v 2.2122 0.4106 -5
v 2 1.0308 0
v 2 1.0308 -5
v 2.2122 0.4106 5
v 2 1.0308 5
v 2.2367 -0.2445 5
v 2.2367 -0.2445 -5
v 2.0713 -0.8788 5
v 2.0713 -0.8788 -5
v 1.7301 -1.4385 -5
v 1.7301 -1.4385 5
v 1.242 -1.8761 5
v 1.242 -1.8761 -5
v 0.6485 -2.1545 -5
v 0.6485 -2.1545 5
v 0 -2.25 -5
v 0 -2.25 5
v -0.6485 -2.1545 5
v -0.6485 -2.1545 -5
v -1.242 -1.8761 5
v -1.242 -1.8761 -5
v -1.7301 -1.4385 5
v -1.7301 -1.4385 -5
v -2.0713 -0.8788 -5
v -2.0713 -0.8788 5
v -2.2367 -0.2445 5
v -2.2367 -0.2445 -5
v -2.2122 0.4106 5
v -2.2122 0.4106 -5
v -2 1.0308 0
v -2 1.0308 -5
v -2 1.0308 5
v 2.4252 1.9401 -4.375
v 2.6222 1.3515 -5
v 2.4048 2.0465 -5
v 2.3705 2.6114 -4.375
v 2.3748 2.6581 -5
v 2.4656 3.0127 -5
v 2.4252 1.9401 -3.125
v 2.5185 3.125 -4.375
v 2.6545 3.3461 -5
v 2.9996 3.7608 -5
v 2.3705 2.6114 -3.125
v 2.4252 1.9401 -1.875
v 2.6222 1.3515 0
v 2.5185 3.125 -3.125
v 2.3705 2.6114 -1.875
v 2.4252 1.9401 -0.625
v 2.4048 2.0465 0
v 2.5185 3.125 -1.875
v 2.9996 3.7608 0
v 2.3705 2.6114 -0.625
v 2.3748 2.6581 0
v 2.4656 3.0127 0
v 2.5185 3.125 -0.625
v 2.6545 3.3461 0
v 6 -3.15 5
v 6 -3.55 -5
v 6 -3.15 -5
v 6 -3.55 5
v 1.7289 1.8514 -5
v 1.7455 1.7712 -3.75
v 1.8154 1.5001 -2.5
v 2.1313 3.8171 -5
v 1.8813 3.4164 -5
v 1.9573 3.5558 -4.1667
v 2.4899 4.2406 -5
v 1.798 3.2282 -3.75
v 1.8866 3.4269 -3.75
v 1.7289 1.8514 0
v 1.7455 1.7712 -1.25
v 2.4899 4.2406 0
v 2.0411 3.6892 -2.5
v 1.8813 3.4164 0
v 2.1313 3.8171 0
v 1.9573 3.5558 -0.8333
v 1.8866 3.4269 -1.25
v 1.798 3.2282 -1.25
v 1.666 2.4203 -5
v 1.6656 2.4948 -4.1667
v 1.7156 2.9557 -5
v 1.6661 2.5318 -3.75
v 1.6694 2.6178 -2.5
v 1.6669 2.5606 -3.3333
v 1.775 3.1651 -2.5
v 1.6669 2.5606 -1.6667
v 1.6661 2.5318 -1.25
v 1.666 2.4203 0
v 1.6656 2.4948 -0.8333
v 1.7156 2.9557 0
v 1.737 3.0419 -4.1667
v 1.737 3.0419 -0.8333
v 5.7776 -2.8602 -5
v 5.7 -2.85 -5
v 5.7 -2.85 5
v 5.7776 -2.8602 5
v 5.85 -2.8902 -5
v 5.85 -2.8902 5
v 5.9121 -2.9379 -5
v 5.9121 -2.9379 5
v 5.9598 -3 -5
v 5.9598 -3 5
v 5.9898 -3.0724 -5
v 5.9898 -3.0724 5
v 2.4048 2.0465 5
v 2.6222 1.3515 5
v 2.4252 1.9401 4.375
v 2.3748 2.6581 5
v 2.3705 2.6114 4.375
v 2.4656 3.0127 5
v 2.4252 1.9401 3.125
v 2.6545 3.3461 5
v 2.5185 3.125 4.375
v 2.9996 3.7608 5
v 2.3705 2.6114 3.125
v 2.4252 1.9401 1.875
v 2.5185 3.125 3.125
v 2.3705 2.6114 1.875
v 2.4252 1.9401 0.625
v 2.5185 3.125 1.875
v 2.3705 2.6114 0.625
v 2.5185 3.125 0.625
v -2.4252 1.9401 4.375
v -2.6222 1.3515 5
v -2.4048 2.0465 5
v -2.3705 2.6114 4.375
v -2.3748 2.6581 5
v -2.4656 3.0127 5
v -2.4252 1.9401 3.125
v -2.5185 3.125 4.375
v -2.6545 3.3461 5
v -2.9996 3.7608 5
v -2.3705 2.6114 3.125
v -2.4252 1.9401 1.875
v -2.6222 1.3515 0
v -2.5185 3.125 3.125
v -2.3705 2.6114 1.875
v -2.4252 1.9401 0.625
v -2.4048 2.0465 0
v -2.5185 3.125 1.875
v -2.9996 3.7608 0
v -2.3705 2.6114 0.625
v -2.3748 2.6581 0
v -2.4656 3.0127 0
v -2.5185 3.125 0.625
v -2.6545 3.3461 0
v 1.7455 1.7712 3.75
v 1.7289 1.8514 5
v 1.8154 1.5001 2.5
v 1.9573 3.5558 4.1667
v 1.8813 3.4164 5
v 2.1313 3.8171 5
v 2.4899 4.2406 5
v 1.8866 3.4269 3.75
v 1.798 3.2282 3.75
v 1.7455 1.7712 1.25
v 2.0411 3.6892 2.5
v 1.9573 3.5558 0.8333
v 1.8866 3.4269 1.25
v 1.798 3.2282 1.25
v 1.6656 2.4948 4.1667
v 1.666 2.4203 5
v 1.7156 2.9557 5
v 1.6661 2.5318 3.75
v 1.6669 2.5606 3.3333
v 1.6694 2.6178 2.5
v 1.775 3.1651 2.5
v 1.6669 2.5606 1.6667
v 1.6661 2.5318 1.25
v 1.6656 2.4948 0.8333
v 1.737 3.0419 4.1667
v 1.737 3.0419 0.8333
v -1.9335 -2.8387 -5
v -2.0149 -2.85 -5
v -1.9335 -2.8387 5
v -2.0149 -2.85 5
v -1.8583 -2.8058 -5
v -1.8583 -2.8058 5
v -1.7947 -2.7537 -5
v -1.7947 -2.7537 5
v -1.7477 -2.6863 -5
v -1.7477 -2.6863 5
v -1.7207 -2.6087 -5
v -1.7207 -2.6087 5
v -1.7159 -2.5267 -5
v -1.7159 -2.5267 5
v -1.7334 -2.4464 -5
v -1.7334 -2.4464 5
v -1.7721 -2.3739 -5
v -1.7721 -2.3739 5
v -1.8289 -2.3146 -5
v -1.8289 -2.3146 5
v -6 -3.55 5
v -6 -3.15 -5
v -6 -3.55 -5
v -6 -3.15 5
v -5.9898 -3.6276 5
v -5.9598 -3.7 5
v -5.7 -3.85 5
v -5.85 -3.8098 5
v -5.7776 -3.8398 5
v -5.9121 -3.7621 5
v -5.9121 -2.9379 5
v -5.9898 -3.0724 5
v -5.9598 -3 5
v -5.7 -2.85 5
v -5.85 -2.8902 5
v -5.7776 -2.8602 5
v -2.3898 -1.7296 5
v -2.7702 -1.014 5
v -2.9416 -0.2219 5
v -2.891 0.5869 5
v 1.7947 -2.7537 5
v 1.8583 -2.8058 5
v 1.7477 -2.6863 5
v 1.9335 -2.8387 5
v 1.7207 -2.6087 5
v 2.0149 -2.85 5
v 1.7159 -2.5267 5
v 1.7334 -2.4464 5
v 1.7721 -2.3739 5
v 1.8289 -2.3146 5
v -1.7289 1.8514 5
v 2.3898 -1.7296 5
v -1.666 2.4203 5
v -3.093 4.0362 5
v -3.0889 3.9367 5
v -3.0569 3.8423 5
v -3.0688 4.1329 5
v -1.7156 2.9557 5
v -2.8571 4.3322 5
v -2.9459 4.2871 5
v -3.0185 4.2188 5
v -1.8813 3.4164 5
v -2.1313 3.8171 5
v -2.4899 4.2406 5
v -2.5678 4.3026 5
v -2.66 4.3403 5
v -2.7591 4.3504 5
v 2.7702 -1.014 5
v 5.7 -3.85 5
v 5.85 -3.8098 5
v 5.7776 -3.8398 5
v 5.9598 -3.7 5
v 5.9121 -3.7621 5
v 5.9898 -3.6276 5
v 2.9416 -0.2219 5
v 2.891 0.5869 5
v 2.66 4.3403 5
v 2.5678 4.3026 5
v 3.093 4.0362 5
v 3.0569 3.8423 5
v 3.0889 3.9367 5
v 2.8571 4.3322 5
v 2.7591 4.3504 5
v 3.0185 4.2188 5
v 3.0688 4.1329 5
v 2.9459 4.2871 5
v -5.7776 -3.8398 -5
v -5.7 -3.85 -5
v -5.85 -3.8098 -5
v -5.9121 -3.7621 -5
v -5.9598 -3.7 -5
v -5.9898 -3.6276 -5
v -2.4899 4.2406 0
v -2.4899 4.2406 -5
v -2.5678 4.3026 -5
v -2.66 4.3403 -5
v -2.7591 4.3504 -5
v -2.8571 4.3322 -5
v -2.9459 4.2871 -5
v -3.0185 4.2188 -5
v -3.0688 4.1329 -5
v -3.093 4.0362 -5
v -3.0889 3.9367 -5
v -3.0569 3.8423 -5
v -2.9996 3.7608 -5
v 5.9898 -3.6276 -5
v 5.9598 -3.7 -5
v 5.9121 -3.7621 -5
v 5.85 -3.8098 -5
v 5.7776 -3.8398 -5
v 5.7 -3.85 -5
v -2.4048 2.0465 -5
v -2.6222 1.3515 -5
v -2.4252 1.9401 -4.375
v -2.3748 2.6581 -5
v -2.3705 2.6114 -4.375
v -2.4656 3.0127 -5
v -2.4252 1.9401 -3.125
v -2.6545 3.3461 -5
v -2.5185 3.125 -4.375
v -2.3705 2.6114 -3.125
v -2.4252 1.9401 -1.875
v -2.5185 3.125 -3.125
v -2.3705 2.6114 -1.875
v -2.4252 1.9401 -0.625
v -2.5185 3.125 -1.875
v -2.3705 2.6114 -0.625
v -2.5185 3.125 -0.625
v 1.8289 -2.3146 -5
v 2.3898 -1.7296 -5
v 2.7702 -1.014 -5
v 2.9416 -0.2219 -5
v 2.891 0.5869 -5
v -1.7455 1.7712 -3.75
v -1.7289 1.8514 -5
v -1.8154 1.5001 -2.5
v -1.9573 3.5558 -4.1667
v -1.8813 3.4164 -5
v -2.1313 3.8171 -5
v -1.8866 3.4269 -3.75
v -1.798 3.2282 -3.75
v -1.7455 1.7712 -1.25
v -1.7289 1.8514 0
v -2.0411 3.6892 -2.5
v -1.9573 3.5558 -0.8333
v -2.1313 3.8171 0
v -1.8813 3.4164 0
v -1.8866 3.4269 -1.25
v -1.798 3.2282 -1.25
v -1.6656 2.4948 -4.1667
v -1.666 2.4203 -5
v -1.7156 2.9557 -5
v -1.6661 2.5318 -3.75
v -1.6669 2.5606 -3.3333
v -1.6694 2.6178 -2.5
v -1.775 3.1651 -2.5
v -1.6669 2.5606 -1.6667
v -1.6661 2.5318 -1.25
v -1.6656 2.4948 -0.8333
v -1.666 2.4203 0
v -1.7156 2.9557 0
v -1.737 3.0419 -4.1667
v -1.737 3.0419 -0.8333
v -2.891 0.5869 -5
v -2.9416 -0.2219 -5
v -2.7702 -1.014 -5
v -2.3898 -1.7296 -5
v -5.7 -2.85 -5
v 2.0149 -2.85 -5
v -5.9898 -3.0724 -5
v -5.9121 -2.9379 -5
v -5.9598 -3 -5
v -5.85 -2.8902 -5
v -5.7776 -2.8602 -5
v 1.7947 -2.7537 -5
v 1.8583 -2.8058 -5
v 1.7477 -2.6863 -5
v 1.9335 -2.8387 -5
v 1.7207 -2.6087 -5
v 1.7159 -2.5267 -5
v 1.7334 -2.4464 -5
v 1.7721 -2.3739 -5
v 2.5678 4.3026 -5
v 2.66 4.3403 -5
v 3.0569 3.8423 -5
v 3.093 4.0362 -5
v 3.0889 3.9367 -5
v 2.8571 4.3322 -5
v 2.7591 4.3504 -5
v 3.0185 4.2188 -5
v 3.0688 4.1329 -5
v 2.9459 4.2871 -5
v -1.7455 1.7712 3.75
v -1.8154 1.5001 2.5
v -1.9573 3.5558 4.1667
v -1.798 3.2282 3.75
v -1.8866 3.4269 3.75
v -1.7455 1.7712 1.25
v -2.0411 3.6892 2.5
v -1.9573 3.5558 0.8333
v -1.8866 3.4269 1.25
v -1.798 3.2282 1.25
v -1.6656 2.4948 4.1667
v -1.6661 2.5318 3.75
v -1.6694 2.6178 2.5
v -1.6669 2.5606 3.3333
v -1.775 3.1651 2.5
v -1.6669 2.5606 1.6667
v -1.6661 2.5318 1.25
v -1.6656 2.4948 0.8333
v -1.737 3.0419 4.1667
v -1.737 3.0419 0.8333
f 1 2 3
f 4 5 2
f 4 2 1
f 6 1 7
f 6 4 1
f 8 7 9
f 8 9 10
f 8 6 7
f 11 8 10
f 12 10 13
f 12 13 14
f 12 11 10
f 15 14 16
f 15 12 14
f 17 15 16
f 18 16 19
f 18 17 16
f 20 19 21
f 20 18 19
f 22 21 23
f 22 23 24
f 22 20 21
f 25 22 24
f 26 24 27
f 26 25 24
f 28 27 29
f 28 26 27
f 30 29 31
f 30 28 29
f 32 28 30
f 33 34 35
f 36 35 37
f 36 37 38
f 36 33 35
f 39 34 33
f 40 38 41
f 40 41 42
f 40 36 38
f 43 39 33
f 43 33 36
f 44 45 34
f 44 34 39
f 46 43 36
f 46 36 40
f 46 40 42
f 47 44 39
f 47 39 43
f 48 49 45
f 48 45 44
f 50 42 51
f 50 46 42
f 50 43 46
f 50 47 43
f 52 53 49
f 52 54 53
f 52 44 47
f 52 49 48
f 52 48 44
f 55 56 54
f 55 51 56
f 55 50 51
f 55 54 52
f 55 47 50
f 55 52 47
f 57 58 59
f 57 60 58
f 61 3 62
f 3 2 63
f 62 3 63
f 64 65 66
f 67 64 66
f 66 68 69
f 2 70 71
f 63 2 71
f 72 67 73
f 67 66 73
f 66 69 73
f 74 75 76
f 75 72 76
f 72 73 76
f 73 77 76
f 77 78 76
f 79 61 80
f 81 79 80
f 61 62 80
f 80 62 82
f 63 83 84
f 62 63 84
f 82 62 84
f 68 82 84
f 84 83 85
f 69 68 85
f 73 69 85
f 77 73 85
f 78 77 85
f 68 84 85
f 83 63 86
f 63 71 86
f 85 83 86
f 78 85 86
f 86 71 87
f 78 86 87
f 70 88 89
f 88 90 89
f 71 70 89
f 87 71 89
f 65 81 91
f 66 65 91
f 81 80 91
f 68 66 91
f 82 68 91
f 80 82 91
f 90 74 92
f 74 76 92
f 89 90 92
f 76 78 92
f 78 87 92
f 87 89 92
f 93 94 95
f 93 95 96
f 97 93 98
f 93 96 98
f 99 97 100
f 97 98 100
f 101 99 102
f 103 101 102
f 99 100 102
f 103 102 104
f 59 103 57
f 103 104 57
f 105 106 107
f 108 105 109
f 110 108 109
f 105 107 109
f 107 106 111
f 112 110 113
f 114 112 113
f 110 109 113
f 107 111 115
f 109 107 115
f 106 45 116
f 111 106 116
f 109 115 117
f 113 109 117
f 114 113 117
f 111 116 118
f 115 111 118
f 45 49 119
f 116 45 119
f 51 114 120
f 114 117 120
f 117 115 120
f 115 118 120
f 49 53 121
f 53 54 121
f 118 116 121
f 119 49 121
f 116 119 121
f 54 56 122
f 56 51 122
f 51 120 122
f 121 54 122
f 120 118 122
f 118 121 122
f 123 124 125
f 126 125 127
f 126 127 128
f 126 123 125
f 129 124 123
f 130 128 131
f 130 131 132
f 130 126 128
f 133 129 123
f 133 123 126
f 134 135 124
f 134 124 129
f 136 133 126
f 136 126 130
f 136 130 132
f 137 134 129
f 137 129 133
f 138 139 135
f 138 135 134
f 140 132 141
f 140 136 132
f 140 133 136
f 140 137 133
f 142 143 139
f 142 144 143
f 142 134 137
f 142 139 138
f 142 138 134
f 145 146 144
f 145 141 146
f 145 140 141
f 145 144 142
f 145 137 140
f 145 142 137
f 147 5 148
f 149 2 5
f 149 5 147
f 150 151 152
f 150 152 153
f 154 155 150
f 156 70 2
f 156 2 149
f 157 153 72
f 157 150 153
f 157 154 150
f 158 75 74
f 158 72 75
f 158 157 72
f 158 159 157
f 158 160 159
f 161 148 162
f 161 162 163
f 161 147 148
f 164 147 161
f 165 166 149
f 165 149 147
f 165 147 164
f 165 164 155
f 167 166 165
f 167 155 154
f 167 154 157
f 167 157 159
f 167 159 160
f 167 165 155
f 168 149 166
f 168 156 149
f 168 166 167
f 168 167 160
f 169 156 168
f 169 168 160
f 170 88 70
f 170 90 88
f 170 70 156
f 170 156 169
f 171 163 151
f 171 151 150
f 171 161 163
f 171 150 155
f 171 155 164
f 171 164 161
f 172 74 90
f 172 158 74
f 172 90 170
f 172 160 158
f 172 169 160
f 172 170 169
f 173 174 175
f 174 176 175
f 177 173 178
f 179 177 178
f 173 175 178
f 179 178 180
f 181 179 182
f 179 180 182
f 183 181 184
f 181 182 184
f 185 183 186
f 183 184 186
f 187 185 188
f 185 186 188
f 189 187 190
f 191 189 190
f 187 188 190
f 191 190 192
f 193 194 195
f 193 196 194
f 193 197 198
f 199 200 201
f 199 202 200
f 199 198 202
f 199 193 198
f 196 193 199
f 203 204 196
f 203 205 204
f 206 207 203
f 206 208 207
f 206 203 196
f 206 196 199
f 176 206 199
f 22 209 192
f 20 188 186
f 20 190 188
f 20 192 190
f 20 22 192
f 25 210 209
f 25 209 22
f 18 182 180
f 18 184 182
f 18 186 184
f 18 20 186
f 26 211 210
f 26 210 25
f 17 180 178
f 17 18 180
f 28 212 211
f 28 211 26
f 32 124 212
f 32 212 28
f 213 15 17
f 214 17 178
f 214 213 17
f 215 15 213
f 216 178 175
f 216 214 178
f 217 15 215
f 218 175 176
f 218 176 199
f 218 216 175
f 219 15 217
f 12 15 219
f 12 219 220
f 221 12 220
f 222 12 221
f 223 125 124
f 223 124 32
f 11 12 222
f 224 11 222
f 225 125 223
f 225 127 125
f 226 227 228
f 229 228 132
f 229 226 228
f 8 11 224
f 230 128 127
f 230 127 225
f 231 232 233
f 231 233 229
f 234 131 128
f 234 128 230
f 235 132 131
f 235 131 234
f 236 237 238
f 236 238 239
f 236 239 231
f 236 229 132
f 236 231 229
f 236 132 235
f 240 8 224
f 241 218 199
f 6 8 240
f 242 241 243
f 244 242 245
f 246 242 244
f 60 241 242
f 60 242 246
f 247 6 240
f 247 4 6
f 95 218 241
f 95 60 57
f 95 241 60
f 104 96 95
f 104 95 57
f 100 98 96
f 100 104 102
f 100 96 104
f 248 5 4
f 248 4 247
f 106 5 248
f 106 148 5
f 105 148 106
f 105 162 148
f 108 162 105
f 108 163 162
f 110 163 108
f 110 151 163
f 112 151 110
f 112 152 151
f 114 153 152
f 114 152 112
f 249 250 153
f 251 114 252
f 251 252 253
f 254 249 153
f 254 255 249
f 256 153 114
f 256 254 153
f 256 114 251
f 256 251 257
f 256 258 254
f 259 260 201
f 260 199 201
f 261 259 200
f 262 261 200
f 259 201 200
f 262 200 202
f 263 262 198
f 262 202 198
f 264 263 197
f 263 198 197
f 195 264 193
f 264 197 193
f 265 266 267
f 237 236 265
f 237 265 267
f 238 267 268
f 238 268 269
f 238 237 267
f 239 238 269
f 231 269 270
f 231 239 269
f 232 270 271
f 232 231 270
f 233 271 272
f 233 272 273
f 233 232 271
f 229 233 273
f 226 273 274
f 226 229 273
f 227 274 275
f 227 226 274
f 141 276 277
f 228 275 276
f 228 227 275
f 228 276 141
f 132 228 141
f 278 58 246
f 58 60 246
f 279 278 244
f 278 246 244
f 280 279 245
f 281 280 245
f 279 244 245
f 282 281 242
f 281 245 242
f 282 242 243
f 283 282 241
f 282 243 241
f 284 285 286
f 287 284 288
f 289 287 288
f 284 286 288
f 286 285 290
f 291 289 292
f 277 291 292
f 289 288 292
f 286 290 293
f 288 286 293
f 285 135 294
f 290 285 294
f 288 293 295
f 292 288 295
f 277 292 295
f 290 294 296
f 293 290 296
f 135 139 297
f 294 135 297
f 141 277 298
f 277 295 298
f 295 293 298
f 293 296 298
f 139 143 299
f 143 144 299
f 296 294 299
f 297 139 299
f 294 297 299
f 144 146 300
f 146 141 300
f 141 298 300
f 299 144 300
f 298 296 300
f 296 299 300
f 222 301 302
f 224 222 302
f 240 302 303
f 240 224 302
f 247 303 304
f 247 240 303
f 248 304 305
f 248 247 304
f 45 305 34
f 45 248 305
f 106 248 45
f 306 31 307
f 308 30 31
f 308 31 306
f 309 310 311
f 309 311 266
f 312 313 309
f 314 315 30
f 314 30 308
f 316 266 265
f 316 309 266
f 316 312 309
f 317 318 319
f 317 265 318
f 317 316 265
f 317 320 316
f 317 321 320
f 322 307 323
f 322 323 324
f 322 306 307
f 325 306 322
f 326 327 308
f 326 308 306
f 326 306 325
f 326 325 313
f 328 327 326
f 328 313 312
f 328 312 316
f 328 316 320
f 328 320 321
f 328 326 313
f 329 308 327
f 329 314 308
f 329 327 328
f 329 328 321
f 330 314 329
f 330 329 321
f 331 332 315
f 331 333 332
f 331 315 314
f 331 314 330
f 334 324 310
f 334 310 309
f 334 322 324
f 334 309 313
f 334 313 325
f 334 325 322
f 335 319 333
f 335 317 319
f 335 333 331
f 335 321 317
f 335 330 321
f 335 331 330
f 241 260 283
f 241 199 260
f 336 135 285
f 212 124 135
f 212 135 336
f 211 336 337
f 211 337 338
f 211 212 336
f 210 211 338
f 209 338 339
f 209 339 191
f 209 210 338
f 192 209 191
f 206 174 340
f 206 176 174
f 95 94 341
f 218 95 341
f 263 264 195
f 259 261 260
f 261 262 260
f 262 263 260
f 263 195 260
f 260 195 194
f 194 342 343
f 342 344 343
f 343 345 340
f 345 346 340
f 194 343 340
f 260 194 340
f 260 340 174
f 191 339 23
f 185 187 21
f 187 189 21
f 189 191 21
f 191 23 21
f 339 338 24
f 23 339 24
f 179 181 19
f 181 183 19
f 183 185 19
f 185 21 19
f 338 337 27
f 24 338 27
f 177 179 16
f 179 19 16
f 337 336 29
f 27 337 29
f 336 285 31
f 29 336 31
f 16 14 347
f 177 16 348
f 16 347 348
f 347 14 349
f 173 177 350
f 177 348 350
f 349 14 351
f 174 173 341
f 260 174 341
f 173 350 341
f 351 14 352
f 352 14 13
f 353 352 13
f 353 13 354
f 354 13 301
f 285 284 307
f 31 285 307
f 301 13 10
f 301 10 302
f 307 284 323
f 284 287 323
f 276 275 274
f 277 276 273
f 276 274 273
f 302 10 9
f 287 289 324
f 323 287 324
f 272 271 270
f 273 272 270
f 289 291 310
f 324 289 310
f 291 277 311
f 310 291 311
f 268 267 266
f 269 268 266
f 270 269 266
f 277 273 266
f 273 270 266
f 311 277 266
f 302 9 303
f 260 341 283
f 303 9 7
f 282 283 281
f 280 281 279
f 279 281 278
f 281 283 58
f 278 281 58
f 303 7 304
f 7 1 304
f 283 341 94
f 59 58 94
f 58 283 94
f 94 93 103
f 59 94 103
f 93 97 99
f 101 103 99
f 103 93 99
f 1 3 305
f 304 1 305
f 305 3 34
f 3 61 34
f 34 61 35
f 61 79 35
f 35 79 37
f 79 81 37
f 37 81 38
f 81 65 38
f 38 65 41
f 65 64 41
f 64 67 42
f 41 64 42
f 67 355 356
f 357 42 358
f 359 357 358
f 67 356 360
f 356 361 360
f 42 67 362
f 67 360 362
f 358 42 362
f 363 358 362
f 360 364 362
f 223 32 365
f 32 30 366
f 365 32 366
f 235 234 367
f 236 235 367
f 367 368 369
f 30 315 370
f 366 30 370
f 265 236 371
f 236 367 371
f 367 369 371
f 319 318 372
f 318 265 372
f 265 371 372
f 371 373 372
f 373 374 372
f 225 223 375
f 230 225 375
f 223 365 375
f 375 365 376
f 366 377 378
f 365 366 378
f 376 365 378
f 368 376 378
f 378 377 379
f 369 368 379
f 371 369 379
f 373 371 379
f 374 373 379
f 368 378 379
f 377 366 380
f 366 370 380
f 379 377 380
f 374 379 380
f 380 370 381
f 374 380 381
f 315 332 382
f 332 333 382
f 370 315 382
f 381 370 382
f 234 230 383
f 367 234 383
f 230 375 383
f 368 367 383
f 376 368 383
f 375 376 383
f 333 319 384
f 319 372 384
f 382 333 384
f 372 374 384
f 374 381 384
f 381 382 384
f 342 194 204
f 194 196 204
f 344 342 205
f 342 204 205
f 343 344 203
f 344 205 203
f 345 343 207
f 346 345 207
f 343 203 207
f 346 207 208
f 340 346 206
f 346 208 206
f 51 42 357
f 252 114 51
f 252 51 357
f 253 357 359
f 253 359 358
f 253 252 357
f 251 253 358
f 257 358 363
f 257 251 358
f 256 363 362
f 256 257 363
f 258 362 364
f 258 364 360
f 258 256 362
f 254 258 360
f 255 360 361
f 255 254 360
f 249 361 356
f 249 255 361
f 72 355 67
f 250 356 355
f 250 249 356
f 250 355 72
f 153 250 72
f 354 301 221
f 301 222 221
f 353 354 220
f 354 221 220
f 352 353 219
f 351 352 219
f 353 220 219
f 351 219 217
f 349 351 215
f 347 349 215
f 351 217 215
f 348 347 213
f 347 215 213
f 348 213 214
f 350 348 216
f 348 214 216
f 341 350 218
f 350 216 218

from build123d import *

# Parameters (mm, degrees)
F1_DEPTH = 5
F2_R     = 0.3


with BuildPart() as f1:
    # F0 (on Top) → F1 (new body, symmetric)
    with BuildSketch(Plane.XY):
        with BuildLine():
            ThreePointArc((2, 1.0307764064), (0, -2.25), (-2, 1.0307764064))
            add(Edge.make_bspline(
                [(-2, 1.0307764064), (-1.7928318797, 1.4327416027), (-1.4752005994, 2.7539357485), (-1.94238935, 3.6588384503), (-2.4898940219, 4.2405549061)],
                knots=[0, 0, 0, 0, 0.4856533037, 1, 1, 1, 1], degree=3))
            ThreePointArc((-2.4898940219, 4.2405549061), (-2.9846417573, 4.255544178), (-2.9996310293, 3.7607964426))
            add(Edge.make_bspline(
                [(-2.6222222222, 1.3514623995), (-2.5879840781, 1.4178941569), (-2.5120919735, 1.5965615902), (-2.4185643331, 1.9365442889), (-2.3646202091, 2.2979855215), (-2.3625995138, 2.6240888033), (-2.4081716924, 2.8742683693), (-2.5044815542, 3.1179920879), (-2.6847308977, 3.4036360851), (-2.8805852991, 3.6343119324), (-2.9996310293, 3.7607964426)],
                knots=[0, 0, 0, 0, 0.125, 0.25, 0.375, 0.5, 0.625, 0.75, 0.875, 1, 1, 1, 1], degree=3))
            ThreePointArc((-2.6222222222, 1.3514623995), (-2.6973313466, -1.1945307057), (-0.7615773106, -2.85))
            Line((-0.7615773106, -2.85), (0.7615773106, -2.85))
            ThreePointArc((0.7615773106, -2.85), (2.6973313466, -1.1945307057), (2.6222222222, 1.3514623995))
            add(Edge.make_bspline(
                [(2.6222222222, 1.3514623995), (2.5879840781, 1.4178941569), (2.5120919735, 1.5965615902), (2.4185643331, 1.9365442889), (2.3646202091, 2.2979855215), (2.3625995138, 2.6240888033), (2.4081716924, 2.8742683693), (2.5044815542, 3.1179920879), (2.6847308977, 3.4036360851), (2.8805852991, 3.6343119324), (2.9996310293, 3.7607964426)],
                knots=[0, 0, 0, 0, 0.125, 0.25, 0.375, 0.5, 0.625, 0.75, 0.875, 1, 1, 1, 1], degree=3))
            ThreePointArc((2.9996310293, 3.7607964426), (2.9846417573, 4.255544178), (2.4898940219, 4.2405549061))
            add(Edge.make_bspline(
                [(2, 1.0307764064), (1.7928318797, 1.4327416027), (1.4752005994, 2.7539357485), (1.94238935, 3.6588384503), (2.4898940219, 4.2405549061)],
                knots=[0, 0, 0, 0, 0.4856533037, 1, 1, 1, 1], degree=3))
        make_face()
        with BuildLine():
            ThreePointArc((0.7615773106, -2.85), (0, -2.95), (-0.7615773106, -2.85))
            Line((-0.7615773106, -2.85), (-6, -2.85))
            Line((-6, -2.85), (-6, -3.85))
            Line((-6, -3.85), (6, -3.85))
            Line((6, -3.85), (6, -2.85))
            Line((6, -2.85), (0.7615773106, -2.85))
        make_face()
        with BuildLine():
            Line((0.7615773106, -2.85), (-0.7615773106, -2.85))
            ThreePointArc((-0.7615773106, -2.85), (0, -2.95), (0.7615773106, -2.85))
        make_face()
    extrude(amount=F1_DEPTH, both=True)

    # F2
    f2_edges = [f1.edges().sort_by_distance(p)[0] for p in [
        (-6, -2.85, 0),
        (-6, -3.85, 0),
        (6, -2.85, 0),
        (6, -3.85, 0),
        (0.761577, -2.85, 0),
        (-0.761577, -2.85, 0),
    ]]
    fillet(f2_edges, radius=F2_R)


solid = f1.part
